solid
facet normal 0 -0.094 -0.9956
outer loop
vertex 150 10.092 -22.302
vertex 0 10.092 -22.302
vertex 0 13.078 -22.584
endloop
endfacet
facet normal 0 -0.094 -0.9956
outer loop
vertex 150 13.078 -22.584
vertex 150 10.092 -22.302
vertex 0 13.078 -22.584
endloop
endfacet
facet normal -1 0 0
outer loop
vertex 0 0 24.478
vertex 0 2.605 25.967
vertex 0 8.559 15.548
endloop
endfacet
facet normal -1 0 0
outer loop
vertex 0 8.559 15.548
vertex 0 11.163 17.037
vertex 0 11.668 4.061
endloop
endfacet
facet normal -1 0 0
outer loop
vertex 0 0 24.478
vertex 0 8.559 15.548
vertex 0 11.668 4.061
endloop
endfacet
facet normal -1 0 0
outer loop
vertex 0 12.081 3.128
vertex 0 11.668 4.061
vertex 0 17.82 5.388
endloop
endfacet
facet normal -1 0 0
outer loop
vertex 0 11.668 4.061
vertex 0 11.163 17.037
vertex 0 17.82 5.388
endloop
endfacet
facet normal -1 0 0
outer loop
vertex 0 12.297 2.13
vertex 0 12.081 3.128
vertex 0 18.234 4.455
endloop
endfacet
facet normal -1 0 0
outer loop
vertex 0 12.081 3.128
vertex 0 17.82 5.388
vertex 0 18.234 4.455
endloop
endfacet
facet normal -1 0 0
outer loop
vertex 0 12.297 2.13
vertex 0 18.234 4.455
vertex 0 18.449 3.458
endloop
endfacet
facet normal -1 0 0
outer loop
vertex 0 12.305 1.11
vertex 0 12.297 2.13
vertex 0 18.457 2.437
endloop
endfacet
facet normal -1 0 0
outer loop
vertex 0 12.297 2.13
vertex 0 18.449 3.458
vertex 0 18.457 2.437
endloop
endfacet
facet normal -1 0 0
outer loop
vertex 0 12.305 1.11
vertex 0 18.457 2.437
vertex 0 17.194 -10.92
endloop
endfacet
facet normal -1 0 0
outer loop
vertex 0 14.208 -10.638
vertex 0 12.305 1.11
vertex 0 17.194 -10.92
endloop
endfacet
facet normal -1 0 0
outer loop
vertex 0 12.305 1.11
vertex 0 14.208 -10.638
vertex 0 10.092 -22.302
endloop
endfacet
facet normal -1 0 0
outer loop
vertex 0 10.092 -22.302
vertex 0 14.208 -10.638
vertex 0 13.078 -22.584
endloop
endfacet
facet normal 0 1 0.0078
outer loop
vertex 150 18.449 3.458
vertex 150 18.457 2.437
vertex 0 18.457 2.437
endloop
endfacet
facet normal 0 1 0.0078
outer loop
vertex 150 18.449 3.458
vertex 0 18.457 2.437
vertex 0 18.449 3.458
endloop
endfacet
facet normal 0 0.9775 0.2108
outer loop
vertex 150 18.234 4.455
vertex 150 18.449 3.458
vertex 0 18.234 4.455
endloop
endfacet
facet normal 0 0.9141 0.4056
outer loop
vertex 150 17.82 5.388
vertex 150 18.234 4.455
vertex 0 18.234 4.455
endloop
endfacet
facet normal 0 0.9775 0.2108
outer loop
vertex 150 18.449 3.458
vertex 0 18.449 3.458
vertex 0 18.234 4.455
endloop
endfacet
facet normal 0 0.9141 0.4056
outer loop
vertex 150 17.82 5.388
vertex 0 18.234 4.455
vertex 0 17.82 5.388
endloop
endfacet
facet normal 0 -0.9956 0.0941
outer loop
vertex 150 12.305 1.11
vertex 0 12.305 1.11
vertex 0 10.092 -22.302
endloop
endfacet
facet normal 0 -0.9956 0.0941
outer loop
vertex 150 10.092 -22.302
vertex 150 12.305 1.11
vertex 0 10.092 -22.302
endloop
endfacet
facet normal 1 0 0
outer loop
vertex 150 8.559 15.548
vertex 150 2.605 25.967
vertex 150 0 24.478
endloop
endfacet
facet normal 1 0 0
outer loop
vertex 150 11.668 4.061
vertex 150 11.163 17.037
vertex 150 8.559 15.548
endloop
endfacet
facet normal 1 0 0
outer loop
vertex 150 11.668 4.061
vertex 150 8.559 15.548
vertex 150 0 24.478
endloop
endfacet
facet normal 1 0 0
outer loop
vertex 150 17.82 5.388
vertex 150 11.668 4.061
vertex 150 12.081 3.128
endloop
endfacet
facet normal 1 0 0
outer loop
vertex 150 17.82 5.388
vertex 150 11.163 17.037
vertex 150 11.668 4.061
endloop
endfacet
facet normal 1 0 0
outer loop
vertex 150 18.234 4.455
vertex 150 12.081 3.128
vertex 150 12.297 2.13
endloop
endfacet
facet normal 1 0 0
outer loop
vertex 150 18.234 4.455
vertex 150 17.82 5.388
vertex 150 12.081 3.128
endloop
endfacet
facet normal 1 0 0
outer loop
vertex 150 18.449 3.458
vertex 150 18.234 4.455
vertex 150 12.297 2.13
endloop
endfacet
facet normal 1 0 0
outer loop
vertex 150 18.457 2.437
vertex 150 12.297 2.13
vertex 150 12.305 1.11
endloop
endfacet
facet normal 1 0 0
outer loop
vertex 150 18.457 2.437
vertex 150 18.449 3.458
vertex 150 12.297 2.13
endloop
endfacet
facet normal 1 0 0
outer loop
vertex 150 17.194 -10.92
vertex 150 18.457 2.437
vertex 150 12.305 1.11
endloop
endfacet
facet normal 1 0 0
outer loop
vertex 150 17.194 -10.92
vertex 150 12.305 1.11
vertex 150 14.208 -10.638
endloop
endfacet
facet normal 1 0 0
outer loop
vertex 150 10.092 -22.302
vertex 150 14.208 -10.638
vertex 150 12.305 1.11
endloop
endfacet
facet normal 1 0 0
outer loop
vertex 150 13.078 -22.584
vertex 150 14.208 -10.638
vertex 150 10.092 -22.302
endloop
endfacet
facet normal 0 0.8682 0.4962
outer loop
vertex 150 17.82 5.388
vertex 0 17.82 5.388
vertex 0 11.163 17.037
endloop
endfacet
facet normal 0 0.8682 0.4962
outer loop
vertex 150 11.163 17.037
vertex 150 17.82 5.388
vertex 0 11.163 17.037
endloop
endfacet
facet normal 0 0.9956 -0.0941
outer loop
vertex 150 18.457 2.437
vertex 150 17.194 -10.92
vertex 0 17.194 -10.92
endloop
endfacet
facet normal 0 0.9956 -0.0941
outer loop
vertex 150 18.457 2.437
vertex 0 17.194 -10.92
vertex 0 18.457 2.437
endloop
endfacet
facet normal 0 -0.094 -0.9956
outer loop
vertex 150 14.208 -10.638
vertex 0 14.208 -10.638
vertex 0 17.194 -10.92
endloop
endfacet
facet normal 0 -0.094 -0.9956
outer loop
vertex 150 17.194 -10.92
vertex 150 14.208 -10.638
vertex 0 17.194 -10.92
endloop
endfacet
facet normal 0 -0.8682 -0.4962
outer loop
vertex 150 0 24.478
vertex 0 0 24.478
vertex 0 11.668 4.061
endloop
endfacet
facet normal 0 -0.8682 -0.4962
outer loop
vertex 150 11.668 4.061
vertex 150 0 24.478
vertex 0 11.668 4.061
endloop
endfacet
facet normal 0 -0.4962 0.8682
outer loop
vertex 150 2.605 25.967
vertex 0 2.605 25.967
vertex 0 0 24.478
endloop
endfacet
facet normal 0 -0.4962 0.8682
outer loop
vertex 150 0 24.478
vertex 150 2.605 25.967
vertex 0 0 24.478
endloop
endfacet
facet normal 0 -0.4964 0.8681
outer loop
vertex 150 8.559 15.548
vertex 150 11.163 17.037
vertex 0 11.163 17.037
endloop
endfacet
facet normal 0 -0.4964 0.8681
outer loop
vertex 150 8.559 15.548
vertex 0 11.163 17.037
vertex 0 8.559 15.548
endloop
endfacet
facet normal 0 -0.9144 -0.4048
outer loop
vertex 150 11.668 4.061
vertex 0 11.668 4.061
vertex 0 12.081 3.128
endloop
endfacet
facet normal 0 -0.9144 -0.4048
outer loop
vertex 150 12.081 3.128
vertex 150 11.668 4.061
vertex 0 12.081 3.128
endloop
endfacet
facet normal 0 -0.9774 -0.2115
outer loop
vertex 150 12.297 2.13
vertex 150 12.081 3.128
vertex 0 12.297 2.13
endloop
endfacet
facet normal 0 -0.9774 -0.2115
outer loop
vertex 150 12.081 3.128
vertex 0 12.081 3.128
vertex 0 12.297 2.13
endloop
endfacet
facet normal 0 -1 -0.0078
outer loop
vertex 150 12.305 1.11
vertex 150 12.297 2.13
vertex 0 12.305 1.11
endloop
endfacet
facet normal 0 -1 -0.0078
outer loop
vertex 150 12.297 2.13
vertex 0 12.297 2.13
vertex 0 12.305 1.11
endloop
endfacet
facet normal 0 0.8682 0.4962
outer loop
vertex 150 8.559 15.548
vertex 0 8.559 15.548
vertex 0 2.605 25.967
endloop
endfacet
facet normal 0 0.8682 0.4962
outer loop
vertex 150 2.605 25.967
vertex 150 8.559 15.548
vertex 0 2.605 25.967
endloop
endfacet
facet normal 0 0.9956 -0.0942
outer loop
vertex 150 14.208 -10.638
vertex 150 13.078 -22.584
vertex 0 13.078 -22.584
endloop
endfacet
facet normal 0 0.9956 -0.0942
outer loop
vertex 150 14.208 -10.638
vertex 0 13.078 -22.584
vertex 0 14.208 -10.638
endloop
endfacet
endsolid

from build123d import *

# Parameters (mm, degrees)
BOSS_EXTRUDE1_DEPTH = 150


with BuildPart() as part:
    # Sketch1 → Boss-Extrude1 (new body)
    with BuildSketch(Plane(origin=(0, 0, 0), x_dir=(0, 0, -1), z_dir=(1, 0, 0))):
        with BuildLine():
            Line((-17.036770748, 11.163475068), (-15.548231796, 8.558815438))
            Line((-15.548231796, 8.558815438), (-25.966870317, 2.60465963))
            Line((-25.966870317, 2.60465963), (-24.478331365, 0))
            Line((-24.478331365, 0), (-4.061294033, 11.668148498))
            ThreePointArc((-4.061294033, 11.668148498), (-2.634767864, 12.21461492), (-1.109822283, 12.304855919))
            Line((-1.109822283, 12.304855919), (22.301972464, 10.091638219))
            Line((22.301972464, 10.091638219), (22.584316562, 13.078322302))
            Line((22.584316562, 13.078322302), (10.637586676, 14.207766865))
            Line((10.637586676, 14.207766865), (10.919947816, 17.194449336))
            Line((10.919947816, 17.194449336), (-2.436908153, 18.457130406))
            ThreePointArc((-2.436908153, 18.457130406), (-3.961853734, 18.366889408), (-5.388379903, 17.820422985))
            Line((-5.388379903, 17.820422985), (-17.036770748, 11.163475068))
        make_face()
    extrude(amount=BOSS_EXTRUDE1_DEPTH)


solid = part.part
